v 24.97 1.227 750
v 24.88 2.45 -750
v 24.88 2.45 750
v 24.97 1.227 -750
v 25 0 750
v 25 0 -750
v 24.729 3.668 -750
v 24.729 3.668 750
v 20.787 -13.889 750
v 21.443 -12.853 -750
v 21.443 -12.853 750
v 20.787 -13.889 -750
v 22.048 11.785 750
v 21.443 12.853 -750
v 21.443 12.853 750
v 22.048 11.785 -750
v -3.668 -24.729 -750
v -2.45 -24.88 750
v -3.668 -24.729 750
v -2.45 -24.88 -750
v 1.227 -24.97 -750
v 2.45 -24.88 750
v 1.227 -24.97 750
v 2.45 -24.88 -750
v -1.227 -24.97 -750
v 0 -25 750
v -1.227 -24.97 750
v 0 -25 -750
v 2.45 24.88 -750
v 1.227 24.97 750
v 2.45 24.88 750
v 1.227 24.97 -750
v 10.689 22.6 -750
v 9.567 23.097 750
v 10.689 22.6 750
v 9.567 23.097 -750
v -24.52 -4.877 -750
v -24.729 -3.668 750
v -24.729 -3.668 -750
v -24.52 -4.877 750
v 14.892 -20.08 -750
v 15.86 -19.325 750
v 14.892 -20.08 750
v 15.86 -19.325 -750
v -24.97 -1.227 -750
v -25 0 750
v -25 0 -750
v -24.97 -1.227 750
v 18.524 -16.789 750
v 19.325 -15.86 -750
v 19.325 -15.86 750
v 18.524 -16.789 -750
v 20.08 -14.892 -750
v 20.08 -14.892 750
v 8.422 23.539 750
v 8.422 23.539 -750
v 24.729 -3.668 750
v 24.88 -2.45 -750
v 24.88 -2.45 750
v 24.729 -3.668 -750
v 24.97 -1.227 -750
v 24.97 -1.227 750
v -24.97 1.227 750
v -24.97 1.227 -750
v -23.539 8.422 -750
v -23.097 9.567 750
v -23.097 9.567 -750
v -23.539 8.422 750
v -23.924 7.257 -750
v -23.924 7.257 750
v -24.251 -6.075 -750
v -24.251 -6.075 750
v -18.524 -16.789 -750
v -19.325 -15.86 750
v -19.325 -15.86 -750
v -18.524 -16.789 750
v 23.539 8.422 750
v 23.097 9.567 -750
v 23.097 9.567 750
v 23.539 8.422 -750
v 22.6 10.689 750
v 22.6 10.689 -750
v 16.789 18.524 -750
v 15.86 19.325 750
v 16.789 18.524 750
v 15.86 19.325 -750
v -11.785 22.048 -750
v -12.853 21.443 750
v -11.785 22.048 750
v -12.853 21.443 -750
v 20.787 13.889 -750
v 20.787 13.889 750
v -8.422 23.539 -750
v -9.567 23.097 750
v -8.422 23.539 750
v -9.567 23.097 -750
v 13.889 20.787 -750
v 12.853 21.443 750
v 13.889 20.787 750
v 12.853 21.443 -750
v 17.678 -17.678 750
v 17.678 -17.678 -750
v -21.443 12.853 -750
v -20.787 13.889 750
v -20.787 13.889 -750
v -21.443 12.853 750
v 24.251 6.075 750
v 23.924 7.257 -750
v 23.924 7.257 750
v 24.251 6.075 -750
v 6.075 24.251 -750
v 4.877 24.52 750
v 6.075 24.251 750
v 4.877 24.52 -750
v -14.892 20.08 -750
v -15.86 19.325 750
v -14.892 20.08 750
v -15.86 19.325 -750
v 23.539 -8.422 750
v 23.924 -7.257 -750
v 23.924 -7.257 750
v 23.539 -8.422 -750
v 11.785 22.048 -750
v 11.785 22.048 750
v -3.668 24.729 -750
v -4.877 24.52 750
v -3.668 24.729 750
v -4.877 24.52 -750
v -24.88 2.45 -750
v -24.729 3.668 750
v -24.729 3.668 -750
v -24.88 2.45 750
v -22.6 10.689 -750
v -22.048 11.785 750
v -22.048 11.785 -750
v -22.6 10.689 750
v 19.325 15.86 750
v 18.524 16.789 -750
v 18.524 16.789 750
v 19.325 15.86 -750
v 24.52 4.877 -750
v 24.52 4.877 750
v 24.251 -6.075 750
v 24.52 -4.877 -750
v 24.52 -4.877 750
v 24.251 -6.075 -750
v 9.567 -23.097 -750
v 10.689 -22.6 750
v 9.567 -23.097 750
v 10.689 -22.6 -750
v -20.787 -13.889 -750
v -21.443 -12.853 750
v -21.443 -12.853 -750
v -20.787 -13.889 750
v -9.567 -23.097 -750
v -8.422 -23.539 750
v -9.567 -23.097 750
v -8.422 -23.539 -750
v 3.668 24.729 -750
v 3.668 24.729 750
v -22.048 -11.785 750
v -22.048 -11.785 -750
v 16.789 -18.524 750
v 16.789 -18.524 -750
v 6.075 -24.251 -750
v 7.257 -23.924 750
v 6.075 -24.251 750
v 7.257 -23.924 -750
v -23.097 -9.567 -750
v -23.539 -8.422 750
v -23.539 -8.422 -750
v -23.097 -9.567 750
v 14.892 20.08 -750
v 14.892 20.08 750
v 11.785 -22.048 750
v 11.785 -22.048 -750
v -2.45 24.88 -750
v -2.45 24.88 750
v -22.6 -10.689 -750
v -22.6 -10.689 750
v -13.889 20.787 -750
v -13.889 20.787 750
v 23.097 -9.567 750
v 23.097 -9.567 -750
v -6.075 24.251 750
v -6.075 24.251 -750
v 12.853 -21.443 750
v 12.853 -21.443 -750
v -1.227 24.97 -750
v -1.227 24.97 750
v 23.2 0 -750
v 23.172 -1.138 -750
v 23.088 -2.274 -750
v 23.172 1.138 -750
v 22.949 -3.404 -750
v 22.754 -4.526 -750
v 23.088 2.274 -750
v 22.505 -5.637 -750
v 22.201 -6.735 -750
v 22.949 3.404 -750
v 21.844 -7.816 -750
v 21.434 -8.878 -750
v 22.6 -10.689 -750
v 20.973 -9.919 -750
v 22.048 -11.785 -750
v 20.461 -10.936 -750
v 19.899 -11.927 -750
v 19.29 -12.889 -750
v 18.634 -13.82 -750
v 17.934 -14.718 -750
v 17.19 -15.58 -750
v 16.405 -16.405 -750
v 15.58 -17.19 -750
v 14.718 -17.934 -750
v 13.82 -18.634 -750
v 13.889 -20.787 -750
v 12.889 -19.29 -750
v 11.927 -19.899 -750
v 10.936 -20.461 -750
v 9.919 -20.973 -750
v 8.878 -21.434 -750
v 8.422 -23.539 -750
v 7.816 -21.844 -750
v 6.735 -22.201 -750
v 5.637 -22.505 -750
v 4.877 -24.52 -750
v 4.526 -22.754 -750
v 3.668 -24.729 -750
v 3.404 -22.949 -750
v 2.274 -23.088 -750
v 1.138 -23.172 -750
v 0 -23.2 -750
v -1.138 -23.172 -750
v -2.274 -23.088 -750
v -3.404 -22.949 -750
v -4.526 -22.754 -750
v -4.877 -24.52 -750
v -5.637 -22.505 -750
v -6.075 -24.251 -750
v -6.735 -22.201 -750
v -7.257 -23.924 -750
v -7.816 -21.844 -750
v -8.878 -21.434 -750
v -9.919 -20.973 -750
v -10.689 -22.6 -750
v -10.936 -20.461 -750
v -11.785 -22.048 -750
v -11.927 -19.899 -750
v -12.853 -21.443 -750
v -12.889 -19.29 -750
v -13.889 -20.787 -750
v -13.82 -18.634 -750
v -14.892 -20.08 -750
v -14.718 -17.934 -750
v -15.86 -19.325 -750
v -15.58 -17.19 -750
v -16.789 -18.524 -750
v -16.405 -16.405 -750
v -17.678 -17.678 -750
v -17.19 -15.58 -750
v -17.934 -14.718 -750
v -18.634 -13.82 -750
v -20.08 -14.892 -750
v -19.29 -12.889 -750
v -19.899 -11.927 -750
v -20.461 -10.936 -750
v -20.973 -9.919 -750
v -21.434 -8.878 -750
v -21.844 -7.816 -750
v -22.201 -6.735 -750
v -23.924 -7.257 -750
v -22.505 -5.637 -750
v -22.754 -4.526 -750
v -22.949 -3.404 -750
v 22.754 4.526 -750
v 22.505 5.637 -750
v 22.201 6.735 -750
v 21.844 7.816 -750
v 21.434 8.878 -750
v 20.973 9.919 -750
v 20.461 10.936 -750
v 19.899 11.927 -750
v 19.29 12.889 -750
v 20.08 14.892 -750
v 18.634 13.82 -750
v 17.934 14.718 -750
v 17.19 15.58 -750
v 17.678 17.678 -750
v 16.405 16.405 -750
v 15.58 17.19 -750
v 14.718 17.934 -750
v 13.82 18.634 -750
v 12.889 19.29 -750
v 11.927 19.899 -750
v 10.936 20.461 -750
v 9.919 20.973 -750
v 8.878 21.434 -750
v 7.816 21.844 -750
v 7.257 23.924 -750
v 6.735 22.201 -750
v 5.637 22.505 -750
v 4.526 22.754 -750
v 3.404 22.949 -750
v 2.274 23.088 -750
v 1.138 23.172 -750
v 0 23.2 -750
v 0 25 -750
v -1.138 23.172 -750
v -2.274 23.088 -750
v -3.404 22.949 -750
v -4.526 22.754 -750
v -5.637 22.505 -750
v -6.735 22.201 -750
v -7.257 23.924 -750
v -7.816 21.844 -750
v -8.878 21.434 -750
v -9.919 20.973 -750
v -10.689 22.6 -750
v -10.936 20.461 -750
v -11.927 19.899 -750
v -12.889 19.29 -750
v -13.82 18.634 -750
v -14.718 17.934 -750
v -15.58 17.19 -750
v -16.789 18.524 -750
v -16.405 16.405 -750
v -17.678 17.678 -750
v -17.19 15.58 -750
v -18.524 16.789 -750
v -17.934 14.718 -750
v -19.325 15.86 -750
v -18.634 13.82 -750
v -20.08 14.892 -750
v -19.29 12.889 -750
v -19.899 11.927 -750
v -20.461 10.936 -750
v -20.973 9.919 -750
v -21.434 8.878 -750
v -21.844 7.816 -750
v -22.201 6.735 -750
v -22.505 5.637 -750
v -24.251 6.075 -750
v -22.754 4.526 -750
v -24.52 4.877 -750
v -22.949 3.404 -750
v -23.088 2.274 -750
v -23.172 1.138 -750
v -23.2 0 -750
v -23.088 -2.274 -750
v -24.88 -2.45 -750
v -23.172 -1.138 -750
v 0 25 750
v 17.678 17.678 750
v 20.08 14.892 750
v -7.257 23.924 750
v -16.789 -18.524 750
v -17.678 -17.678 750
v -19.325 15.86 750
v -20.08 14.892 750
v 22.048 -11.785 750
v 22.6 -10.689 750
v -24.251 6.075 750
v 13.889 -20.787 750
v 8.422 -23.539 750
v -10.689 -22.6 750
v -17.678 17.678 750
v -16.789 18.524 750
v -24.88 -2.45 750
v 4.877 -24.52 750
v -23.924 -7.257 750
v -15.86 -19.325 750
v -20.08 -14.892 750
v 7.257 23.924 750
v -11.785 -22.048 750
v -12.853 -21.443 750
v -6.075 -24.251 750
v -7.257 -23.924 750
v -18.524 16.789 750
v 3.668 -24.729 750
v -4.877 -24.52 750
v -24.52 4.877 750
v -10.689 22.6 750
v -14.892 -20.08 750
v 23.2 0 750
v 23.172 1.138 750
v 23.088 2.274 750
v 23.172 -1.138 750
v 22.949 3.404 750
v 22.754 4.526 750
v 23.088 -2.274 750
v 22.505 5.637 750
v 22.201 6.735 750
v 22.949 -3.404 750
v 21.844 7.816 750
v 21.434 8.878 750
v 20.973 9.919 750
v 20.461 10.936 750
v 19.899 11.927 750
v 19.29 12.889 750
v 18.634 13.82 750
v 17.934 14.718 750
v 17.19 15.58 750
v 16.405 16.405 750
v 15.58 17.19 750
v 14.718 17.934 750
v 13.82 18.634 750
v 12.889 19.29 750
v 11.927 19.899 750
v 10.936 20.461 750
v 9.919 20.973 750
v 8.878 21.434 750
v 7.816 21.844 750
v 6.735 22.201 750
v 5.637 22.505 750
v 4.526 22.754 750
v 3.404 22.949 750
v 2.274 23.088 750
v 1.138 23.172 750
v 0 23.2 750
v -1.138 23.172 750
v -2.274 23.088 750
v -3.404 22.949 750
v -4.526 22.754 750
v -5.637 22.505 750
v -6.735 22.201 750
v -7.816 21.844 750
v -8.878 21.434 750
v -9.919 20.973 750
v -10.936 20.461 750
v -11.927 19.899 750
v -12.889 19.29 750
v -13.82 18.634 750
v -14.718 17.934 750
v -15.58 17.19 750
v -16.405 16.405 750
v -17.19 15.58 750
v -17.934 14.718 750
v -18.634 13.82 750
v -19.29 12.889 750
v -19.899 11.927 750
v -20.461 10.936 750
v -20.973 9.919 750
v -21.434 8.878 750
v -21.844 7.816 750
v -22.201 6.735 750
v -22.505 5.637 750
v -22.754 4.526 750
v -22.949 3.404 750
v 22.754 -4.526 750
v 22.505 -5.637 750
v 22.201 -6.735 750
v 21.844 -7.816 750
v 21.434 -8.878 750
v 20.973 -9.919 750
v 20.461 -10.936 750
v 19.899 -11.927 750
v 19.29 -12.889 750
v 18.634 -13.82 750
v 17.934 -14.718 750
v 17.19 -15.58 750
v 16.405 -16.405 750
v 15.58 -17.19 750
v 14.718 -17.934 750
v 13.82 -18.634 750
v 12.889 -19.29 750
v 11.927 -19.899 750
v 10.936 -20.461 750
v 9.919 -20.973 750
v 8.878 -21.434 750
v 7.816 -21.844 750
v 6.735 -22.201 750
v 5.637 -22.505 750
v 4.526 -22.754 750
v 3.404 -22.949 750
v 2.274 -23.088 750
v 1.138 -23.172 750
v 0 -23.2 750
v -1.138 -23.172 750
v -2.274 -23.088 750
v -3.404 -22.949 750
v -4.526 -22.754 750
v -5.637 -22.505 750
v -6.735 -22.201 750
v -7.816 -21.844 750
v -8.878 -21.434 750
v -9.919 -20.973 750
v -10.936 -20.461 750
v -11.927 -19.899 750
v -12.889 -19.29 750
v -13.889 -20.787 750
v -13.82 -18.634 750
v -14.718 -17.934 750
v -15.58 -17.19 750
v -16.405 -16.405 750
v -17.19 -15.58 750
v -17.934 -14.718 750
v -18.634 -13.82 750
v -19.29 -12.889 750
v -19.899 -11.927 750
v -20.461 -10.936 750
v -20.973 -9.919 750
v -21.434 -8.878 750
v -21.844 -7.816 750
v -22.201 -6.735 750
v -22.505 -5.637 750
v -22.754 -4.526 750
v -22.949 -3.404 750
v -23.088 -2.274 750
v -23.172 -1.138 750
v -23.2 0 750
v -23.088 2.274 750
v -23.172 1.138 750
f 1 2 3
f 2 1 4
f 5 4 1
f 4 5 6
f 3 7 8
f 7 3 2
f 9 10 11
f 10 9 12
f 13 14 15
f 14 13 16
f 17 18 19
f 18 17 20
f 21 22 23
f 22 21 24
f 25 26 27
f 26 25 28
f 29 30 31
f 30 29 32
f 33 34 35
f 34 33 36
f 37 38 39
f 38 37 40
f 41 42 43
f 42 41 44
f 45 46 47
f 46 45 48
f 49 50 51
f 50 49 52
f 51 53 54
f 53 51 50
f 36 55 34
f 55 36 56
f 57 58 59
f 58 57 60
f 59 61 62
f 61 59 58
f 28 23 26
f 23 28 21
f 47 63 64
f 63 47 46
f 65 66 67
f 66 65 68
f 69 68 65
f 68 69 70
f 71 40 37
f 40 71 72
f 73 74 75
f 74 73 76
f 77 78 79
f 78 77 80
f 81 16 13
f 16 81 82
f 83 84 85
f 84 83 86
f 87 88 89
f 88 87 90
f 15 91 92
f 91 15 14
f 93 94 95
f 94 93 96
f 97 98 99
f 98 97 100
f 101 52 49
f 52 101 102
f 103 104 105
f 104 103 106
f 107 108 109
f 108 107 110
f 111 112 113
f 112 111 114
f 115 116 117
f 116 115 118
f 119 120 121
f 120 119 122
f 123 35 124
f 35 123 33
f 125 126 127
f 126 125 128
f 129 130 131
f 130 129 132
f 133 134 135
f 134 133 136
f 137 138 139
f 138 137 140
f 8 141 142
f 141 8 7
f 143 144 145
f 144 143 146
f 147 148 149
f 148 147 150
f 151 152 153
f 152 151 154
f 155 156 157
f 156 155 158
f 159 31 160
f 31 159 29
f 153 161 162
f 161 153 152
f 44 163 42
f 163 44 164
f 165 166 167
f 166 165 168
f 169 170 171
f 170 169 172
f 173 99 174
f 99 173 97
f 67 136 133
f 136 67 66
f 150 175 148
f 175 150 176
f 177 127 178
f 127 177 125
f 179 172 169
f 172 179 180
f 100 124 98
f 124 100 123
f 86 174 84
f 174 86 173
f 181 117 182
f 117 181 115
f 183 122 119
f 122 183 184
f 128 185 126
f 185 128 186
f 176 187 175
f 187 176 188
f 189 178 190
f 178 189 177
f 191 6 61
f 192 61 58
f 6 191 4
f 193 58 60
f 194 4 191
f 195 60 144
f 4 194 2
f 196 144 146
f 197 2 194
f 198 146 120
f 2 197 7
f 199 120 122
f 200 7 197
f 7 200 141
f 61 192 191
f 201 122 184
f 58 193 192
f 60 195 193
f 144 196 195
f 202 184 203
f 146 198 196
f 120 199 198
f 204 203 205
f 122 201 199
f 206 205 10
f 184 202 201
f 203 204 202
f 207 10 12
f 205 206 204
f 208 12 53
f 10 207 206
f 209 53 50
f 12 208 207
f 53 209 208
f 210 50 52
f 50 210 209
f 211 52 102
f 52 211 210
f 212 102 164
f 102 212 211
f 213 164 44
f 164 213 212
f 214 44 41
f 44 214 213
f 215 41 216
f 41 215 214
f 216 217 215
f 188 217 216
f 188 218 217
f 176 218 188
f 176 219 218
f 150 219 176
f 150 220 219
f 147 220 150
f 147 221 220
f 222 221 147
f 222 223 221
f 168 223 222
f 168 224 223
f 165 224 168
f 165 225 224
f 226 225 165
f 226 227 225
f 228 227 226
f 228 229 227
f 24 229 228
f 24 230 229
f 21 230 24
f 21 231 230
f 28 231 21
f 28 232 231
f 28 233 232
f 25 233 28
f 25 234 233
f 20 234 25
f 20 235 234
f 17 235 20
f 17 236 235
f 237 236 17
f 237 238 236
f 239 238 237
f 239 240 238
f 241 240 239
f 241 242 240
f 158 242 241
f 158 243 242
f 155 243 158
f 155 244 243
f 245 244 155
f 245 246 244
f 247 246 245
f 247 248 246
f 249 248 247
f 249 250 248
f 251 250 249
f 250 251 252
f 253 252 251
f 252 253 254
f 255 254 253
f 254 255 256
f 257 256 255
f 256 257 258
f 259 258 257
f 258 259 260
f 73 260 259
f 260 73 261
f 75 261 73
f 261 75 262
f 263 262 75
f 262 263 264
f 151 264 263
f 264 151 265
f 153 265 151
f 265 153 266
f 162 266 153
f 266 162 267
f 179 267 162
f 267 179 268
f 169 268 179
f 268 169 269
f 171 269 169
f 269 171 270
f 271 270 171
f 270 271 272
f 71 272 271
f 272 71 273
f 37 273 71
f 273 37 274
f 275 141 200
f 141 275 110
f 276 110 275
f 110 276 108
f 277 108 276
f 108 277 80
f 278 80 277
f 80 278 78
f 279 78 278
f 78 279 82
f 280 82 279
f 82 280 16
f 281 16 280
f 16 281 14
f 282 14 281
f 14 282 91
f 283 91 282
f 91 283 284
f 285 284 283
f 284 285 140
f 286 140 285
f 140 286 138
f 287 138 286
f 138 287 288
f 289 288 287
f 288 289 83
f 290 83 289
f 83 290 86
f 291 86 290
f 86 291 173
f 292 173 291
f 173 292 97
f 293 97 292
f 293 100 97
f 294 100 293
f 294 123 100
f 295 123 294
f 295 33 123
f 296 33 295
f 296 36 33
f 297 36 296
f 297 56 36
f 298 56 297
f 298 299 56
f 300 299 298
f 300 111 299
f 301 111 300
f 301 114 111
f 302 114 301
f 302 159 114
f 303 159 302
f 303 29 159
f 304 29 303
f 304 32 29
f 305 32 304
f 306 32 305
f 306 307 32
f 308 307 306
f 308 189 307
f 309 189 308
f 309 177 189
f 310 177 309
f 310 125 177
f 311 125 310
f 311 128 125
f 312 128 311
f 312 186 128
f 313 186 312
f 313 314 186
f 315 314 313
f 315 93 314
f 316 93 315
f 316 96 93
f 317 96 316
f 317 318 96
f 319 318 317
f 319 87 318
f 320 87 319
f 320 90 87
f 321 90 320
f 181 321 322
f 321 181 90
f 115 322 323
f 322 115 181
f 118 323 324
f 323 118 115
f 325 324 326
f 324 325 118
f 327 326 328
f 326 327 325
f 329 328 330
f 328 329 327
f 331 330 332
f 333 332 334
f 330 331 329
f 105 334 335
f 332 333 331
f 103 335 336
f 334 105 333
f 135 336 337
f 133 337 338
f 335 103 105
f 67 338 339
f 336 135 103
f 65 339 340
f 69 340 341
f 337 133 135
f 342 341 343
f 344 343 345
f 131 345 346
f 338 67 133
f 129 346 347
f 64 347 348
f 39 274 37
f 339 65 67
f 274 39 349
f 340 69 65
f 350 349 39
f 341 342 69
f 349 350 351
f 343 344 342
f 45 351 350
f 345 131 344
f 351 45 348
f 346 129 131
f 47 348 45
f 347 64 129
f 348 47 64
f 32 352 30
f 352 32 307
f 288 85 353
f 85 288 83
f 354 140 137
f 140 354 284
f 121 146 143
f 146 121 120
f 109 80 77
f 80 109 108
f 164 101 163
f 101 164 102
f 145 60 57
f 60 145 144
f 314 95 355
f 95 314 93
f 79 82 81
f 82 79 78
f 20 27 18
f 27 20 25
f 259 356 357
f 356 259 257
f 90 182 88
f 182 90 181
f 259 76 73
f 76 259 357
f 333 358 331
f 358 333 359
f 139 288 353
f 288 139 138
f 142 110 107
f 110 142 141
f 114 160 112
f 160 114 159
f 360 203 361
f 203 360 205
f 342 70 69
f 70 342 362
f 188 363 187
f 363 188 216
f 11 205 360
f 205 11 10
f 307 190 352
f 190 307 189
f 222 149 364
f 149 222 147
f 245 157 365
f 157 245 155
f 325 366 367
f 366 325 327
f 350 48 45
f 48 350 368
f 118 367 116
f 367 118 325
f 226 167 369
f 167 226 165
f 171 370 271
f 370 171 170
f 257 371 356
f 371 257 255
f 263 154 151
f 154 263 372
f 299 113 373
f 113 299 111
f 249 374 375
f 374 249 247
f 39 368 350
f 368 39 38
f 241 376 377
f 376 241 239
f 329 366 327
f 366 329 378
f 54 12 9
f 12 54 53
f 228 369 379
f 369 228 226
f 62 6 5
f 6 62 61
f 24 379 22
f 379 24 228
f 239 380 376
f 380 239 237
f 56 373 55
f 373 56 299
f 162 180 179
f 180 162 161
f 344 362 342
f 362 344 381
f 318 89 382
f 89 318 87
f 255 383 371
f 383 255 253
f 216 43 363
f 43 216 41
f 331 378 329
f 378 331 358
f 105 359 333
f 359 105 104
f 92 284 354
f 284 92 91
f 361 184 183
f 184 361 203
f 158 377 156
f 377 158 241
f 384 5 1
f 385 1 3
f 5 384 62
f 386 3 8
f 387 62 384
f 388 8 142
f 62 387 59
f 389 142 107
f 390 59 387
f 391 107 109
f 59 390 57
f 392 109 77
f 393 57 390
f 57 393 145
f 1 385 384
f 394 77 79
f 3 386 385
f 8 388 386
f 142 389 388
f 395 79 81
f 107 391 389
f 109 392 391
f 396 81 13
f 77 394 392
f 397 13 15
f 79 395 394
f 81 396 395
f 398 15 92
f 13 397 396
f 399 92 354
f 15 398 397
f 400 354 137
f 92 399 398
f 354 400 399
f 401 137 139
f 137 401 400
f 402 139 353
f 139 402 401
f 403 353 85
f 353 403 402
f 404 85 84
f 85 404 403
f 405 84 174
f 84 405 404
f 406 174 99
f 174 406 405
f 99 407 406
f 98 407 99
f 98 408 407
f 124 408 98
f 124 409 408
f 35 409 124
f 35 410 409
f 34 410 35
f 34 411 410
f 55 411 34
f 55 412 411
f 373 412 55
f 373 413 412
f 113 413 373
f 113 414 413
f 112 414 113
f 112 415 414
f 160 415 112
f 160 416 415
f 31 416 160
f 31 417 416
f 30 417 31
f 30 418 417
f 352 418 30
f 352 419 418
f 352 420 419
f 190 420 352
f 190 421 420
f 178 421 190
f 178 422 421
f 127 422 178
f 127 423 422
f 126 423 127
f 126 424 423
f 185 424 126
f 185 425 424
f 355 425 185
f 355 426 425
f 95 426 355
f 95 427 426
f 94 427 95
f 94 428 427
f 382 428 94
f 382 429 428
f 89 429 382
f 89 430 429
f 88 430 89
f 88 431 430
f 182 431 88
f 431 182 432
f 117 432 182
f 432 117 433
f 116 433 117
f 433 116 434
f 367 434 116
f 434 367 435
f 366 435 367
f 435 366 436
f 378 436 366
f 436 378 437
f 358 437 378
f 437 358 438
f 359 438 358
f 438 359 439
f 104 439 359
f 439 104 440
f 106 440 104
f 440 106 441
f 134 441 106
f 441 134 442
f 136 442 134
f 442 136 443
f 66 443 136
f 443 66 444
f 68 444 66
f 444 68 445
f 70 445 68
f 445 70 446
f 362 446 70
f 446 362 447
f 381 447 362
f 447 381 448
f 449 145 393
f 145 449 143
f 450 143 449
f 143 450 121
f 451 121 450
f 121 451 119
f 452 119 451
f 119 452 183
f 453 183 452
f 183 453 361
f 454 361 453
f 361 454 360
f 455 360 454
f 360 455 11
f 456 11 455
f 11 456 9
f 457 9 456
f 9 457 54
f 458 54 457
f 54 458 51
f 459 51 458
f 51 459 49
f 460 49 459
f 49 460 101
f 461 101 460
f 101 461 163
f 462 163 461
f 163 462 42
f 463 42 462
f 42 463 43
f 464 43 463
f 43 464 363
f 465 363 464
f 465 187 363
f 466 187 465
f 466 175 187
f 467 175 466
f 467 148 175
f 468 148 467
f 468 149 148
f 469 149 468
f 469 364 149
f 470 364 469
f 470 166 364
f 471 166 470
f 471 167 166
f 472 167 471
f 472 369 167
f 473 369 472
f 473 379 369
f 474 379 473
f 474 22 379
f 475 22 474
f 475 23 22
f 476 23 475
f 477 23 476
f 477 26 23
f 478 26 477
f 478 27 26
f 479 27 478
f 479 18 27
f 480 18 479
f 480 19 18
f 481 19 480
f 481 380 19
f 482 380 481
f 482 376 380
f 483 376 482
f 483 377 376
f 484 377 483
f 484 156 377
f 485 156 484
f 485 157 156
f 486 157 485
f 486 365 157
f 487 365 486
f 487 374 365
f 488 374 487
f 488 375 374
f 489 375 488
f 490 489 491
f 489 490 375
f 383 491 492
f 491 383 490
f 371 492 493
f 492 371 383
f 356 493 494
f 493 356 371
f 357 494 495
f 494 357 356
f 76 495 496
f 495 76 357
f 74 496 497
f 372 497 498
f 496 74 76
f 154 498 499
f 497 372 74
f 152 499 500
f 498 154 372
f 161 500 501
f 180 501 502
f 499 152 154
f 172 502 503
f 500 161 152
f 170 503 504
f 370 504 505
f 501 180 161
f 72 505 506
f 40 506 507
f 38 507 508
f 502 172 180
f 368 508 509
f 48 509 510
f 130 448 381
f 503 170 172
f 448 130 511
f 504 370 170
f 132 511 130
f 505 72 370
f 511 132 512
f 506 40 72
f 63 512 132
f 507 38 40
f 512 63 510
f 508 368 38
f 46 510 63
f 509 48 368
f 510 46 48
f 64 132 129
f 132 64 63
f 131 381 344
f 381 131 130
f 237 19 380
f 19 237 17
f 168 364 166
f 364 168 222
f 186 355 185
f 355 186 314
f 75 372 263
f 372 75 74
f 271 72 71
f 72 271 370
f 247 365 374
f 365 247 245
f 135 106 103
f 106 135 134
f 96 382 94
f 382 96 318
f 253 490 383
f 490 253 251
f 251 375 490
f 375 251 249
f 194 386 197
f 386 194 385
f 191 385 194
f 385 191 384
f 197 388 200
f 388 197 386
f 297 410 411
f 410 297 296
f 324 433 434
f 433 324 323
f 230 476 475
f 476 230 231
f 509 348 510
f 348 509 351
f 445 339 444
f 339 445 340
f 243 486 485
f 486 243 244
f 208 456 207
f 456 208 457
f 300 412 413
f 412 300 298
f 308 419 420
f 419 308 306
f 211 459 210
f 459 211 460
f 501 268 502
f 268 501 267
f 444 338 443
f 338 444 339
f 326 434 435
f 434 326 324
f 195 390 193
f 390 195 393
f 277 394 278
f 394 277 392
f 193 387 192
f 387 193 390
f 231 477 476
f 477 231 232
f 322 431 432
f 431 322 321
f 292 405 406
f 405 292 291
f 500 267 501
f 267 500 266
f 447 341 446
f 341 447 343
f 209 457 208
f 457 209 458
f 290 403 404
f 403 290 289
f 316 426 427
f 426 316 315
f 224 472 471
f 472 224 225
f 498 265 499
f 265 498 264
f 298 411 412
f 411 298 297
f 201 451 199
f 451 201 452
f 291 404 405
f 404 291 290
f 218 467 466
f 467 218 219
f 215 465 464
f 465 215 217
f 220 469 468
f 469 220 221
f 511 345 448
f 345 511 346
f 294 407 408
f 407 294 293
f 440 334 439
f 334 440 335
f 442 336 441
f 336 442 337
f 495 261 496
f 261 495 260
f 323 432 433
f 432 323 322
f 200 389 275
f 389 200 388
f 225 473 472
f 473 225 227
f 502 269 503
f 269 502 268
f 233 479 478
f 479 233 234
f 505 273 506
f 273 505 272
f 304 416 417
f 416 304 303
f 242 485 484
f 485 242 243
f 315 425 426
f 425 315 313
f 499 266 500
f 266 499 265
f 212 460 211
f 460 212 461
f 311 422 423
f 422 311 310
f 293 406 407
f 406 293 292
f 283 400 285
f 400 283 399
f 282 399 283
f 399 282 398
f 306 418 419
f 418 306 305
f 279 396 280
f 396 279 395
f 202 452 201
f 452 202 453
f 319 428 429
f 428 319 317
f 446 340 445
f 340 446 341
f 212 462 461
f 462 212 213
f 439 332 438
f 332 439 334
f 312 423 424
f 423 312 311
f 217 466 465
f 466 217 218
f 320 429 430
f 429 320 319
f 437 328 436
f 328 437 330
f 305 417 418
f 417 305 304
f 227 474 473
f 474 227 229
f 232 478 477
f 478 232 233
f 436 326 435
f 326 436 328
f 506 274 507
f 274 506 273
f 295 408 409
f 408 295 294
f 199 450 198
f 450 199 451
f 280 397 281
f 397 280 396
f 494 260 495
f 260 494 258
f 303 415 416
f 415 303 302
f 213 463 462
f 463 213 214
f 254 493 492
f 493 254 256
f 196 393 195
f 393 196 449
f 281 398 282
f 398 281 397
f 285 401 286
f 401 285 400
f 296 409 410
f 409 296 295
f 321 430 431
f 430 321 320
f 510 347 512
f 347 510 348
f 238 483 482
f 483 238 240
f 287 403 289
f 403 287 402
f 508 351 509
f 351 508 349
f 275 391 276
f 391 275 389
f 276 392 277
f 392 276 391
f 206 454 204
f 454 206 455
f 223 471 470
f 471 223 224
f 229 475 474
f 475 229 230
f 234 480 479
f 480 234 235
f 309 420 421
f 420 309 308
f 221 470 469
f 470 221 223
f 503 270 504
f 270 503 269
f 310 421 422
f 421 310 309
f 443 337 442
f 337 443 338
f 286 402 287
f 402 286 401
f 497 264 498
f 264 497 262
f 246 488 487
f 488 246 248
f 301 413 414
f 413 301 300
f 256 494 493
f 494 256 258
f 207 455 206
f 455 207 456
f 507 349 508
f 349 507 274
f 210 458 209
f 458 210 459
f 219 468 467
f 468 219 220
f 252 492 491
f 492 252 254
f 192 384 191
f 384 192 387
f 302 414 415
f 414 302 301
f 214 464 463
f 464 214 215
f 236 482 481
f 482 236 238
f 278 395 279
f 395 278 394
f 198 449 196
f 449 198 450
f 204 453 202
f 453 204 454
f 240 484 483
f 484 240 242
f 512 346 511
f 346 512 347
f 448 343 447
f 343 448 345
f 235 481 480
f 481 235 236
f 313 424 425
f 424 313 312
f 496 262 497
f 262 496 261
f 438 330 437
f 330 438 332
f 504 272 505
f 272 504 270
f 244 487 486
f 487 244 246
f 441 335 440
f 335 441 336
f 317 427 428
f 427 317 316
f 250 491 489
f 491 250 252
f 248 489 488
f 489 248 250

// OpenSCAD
$fn=128;

module ht_pipe(od=50, wall=1.8, length=1500) {
    difference() {
        cylinder(h=length, d=od, center=true);
        cylinder(h=length+2, d=od-2*wall, center=true);
    }
}

ht_pipe(od=50, wall=1.8, length=1500);
